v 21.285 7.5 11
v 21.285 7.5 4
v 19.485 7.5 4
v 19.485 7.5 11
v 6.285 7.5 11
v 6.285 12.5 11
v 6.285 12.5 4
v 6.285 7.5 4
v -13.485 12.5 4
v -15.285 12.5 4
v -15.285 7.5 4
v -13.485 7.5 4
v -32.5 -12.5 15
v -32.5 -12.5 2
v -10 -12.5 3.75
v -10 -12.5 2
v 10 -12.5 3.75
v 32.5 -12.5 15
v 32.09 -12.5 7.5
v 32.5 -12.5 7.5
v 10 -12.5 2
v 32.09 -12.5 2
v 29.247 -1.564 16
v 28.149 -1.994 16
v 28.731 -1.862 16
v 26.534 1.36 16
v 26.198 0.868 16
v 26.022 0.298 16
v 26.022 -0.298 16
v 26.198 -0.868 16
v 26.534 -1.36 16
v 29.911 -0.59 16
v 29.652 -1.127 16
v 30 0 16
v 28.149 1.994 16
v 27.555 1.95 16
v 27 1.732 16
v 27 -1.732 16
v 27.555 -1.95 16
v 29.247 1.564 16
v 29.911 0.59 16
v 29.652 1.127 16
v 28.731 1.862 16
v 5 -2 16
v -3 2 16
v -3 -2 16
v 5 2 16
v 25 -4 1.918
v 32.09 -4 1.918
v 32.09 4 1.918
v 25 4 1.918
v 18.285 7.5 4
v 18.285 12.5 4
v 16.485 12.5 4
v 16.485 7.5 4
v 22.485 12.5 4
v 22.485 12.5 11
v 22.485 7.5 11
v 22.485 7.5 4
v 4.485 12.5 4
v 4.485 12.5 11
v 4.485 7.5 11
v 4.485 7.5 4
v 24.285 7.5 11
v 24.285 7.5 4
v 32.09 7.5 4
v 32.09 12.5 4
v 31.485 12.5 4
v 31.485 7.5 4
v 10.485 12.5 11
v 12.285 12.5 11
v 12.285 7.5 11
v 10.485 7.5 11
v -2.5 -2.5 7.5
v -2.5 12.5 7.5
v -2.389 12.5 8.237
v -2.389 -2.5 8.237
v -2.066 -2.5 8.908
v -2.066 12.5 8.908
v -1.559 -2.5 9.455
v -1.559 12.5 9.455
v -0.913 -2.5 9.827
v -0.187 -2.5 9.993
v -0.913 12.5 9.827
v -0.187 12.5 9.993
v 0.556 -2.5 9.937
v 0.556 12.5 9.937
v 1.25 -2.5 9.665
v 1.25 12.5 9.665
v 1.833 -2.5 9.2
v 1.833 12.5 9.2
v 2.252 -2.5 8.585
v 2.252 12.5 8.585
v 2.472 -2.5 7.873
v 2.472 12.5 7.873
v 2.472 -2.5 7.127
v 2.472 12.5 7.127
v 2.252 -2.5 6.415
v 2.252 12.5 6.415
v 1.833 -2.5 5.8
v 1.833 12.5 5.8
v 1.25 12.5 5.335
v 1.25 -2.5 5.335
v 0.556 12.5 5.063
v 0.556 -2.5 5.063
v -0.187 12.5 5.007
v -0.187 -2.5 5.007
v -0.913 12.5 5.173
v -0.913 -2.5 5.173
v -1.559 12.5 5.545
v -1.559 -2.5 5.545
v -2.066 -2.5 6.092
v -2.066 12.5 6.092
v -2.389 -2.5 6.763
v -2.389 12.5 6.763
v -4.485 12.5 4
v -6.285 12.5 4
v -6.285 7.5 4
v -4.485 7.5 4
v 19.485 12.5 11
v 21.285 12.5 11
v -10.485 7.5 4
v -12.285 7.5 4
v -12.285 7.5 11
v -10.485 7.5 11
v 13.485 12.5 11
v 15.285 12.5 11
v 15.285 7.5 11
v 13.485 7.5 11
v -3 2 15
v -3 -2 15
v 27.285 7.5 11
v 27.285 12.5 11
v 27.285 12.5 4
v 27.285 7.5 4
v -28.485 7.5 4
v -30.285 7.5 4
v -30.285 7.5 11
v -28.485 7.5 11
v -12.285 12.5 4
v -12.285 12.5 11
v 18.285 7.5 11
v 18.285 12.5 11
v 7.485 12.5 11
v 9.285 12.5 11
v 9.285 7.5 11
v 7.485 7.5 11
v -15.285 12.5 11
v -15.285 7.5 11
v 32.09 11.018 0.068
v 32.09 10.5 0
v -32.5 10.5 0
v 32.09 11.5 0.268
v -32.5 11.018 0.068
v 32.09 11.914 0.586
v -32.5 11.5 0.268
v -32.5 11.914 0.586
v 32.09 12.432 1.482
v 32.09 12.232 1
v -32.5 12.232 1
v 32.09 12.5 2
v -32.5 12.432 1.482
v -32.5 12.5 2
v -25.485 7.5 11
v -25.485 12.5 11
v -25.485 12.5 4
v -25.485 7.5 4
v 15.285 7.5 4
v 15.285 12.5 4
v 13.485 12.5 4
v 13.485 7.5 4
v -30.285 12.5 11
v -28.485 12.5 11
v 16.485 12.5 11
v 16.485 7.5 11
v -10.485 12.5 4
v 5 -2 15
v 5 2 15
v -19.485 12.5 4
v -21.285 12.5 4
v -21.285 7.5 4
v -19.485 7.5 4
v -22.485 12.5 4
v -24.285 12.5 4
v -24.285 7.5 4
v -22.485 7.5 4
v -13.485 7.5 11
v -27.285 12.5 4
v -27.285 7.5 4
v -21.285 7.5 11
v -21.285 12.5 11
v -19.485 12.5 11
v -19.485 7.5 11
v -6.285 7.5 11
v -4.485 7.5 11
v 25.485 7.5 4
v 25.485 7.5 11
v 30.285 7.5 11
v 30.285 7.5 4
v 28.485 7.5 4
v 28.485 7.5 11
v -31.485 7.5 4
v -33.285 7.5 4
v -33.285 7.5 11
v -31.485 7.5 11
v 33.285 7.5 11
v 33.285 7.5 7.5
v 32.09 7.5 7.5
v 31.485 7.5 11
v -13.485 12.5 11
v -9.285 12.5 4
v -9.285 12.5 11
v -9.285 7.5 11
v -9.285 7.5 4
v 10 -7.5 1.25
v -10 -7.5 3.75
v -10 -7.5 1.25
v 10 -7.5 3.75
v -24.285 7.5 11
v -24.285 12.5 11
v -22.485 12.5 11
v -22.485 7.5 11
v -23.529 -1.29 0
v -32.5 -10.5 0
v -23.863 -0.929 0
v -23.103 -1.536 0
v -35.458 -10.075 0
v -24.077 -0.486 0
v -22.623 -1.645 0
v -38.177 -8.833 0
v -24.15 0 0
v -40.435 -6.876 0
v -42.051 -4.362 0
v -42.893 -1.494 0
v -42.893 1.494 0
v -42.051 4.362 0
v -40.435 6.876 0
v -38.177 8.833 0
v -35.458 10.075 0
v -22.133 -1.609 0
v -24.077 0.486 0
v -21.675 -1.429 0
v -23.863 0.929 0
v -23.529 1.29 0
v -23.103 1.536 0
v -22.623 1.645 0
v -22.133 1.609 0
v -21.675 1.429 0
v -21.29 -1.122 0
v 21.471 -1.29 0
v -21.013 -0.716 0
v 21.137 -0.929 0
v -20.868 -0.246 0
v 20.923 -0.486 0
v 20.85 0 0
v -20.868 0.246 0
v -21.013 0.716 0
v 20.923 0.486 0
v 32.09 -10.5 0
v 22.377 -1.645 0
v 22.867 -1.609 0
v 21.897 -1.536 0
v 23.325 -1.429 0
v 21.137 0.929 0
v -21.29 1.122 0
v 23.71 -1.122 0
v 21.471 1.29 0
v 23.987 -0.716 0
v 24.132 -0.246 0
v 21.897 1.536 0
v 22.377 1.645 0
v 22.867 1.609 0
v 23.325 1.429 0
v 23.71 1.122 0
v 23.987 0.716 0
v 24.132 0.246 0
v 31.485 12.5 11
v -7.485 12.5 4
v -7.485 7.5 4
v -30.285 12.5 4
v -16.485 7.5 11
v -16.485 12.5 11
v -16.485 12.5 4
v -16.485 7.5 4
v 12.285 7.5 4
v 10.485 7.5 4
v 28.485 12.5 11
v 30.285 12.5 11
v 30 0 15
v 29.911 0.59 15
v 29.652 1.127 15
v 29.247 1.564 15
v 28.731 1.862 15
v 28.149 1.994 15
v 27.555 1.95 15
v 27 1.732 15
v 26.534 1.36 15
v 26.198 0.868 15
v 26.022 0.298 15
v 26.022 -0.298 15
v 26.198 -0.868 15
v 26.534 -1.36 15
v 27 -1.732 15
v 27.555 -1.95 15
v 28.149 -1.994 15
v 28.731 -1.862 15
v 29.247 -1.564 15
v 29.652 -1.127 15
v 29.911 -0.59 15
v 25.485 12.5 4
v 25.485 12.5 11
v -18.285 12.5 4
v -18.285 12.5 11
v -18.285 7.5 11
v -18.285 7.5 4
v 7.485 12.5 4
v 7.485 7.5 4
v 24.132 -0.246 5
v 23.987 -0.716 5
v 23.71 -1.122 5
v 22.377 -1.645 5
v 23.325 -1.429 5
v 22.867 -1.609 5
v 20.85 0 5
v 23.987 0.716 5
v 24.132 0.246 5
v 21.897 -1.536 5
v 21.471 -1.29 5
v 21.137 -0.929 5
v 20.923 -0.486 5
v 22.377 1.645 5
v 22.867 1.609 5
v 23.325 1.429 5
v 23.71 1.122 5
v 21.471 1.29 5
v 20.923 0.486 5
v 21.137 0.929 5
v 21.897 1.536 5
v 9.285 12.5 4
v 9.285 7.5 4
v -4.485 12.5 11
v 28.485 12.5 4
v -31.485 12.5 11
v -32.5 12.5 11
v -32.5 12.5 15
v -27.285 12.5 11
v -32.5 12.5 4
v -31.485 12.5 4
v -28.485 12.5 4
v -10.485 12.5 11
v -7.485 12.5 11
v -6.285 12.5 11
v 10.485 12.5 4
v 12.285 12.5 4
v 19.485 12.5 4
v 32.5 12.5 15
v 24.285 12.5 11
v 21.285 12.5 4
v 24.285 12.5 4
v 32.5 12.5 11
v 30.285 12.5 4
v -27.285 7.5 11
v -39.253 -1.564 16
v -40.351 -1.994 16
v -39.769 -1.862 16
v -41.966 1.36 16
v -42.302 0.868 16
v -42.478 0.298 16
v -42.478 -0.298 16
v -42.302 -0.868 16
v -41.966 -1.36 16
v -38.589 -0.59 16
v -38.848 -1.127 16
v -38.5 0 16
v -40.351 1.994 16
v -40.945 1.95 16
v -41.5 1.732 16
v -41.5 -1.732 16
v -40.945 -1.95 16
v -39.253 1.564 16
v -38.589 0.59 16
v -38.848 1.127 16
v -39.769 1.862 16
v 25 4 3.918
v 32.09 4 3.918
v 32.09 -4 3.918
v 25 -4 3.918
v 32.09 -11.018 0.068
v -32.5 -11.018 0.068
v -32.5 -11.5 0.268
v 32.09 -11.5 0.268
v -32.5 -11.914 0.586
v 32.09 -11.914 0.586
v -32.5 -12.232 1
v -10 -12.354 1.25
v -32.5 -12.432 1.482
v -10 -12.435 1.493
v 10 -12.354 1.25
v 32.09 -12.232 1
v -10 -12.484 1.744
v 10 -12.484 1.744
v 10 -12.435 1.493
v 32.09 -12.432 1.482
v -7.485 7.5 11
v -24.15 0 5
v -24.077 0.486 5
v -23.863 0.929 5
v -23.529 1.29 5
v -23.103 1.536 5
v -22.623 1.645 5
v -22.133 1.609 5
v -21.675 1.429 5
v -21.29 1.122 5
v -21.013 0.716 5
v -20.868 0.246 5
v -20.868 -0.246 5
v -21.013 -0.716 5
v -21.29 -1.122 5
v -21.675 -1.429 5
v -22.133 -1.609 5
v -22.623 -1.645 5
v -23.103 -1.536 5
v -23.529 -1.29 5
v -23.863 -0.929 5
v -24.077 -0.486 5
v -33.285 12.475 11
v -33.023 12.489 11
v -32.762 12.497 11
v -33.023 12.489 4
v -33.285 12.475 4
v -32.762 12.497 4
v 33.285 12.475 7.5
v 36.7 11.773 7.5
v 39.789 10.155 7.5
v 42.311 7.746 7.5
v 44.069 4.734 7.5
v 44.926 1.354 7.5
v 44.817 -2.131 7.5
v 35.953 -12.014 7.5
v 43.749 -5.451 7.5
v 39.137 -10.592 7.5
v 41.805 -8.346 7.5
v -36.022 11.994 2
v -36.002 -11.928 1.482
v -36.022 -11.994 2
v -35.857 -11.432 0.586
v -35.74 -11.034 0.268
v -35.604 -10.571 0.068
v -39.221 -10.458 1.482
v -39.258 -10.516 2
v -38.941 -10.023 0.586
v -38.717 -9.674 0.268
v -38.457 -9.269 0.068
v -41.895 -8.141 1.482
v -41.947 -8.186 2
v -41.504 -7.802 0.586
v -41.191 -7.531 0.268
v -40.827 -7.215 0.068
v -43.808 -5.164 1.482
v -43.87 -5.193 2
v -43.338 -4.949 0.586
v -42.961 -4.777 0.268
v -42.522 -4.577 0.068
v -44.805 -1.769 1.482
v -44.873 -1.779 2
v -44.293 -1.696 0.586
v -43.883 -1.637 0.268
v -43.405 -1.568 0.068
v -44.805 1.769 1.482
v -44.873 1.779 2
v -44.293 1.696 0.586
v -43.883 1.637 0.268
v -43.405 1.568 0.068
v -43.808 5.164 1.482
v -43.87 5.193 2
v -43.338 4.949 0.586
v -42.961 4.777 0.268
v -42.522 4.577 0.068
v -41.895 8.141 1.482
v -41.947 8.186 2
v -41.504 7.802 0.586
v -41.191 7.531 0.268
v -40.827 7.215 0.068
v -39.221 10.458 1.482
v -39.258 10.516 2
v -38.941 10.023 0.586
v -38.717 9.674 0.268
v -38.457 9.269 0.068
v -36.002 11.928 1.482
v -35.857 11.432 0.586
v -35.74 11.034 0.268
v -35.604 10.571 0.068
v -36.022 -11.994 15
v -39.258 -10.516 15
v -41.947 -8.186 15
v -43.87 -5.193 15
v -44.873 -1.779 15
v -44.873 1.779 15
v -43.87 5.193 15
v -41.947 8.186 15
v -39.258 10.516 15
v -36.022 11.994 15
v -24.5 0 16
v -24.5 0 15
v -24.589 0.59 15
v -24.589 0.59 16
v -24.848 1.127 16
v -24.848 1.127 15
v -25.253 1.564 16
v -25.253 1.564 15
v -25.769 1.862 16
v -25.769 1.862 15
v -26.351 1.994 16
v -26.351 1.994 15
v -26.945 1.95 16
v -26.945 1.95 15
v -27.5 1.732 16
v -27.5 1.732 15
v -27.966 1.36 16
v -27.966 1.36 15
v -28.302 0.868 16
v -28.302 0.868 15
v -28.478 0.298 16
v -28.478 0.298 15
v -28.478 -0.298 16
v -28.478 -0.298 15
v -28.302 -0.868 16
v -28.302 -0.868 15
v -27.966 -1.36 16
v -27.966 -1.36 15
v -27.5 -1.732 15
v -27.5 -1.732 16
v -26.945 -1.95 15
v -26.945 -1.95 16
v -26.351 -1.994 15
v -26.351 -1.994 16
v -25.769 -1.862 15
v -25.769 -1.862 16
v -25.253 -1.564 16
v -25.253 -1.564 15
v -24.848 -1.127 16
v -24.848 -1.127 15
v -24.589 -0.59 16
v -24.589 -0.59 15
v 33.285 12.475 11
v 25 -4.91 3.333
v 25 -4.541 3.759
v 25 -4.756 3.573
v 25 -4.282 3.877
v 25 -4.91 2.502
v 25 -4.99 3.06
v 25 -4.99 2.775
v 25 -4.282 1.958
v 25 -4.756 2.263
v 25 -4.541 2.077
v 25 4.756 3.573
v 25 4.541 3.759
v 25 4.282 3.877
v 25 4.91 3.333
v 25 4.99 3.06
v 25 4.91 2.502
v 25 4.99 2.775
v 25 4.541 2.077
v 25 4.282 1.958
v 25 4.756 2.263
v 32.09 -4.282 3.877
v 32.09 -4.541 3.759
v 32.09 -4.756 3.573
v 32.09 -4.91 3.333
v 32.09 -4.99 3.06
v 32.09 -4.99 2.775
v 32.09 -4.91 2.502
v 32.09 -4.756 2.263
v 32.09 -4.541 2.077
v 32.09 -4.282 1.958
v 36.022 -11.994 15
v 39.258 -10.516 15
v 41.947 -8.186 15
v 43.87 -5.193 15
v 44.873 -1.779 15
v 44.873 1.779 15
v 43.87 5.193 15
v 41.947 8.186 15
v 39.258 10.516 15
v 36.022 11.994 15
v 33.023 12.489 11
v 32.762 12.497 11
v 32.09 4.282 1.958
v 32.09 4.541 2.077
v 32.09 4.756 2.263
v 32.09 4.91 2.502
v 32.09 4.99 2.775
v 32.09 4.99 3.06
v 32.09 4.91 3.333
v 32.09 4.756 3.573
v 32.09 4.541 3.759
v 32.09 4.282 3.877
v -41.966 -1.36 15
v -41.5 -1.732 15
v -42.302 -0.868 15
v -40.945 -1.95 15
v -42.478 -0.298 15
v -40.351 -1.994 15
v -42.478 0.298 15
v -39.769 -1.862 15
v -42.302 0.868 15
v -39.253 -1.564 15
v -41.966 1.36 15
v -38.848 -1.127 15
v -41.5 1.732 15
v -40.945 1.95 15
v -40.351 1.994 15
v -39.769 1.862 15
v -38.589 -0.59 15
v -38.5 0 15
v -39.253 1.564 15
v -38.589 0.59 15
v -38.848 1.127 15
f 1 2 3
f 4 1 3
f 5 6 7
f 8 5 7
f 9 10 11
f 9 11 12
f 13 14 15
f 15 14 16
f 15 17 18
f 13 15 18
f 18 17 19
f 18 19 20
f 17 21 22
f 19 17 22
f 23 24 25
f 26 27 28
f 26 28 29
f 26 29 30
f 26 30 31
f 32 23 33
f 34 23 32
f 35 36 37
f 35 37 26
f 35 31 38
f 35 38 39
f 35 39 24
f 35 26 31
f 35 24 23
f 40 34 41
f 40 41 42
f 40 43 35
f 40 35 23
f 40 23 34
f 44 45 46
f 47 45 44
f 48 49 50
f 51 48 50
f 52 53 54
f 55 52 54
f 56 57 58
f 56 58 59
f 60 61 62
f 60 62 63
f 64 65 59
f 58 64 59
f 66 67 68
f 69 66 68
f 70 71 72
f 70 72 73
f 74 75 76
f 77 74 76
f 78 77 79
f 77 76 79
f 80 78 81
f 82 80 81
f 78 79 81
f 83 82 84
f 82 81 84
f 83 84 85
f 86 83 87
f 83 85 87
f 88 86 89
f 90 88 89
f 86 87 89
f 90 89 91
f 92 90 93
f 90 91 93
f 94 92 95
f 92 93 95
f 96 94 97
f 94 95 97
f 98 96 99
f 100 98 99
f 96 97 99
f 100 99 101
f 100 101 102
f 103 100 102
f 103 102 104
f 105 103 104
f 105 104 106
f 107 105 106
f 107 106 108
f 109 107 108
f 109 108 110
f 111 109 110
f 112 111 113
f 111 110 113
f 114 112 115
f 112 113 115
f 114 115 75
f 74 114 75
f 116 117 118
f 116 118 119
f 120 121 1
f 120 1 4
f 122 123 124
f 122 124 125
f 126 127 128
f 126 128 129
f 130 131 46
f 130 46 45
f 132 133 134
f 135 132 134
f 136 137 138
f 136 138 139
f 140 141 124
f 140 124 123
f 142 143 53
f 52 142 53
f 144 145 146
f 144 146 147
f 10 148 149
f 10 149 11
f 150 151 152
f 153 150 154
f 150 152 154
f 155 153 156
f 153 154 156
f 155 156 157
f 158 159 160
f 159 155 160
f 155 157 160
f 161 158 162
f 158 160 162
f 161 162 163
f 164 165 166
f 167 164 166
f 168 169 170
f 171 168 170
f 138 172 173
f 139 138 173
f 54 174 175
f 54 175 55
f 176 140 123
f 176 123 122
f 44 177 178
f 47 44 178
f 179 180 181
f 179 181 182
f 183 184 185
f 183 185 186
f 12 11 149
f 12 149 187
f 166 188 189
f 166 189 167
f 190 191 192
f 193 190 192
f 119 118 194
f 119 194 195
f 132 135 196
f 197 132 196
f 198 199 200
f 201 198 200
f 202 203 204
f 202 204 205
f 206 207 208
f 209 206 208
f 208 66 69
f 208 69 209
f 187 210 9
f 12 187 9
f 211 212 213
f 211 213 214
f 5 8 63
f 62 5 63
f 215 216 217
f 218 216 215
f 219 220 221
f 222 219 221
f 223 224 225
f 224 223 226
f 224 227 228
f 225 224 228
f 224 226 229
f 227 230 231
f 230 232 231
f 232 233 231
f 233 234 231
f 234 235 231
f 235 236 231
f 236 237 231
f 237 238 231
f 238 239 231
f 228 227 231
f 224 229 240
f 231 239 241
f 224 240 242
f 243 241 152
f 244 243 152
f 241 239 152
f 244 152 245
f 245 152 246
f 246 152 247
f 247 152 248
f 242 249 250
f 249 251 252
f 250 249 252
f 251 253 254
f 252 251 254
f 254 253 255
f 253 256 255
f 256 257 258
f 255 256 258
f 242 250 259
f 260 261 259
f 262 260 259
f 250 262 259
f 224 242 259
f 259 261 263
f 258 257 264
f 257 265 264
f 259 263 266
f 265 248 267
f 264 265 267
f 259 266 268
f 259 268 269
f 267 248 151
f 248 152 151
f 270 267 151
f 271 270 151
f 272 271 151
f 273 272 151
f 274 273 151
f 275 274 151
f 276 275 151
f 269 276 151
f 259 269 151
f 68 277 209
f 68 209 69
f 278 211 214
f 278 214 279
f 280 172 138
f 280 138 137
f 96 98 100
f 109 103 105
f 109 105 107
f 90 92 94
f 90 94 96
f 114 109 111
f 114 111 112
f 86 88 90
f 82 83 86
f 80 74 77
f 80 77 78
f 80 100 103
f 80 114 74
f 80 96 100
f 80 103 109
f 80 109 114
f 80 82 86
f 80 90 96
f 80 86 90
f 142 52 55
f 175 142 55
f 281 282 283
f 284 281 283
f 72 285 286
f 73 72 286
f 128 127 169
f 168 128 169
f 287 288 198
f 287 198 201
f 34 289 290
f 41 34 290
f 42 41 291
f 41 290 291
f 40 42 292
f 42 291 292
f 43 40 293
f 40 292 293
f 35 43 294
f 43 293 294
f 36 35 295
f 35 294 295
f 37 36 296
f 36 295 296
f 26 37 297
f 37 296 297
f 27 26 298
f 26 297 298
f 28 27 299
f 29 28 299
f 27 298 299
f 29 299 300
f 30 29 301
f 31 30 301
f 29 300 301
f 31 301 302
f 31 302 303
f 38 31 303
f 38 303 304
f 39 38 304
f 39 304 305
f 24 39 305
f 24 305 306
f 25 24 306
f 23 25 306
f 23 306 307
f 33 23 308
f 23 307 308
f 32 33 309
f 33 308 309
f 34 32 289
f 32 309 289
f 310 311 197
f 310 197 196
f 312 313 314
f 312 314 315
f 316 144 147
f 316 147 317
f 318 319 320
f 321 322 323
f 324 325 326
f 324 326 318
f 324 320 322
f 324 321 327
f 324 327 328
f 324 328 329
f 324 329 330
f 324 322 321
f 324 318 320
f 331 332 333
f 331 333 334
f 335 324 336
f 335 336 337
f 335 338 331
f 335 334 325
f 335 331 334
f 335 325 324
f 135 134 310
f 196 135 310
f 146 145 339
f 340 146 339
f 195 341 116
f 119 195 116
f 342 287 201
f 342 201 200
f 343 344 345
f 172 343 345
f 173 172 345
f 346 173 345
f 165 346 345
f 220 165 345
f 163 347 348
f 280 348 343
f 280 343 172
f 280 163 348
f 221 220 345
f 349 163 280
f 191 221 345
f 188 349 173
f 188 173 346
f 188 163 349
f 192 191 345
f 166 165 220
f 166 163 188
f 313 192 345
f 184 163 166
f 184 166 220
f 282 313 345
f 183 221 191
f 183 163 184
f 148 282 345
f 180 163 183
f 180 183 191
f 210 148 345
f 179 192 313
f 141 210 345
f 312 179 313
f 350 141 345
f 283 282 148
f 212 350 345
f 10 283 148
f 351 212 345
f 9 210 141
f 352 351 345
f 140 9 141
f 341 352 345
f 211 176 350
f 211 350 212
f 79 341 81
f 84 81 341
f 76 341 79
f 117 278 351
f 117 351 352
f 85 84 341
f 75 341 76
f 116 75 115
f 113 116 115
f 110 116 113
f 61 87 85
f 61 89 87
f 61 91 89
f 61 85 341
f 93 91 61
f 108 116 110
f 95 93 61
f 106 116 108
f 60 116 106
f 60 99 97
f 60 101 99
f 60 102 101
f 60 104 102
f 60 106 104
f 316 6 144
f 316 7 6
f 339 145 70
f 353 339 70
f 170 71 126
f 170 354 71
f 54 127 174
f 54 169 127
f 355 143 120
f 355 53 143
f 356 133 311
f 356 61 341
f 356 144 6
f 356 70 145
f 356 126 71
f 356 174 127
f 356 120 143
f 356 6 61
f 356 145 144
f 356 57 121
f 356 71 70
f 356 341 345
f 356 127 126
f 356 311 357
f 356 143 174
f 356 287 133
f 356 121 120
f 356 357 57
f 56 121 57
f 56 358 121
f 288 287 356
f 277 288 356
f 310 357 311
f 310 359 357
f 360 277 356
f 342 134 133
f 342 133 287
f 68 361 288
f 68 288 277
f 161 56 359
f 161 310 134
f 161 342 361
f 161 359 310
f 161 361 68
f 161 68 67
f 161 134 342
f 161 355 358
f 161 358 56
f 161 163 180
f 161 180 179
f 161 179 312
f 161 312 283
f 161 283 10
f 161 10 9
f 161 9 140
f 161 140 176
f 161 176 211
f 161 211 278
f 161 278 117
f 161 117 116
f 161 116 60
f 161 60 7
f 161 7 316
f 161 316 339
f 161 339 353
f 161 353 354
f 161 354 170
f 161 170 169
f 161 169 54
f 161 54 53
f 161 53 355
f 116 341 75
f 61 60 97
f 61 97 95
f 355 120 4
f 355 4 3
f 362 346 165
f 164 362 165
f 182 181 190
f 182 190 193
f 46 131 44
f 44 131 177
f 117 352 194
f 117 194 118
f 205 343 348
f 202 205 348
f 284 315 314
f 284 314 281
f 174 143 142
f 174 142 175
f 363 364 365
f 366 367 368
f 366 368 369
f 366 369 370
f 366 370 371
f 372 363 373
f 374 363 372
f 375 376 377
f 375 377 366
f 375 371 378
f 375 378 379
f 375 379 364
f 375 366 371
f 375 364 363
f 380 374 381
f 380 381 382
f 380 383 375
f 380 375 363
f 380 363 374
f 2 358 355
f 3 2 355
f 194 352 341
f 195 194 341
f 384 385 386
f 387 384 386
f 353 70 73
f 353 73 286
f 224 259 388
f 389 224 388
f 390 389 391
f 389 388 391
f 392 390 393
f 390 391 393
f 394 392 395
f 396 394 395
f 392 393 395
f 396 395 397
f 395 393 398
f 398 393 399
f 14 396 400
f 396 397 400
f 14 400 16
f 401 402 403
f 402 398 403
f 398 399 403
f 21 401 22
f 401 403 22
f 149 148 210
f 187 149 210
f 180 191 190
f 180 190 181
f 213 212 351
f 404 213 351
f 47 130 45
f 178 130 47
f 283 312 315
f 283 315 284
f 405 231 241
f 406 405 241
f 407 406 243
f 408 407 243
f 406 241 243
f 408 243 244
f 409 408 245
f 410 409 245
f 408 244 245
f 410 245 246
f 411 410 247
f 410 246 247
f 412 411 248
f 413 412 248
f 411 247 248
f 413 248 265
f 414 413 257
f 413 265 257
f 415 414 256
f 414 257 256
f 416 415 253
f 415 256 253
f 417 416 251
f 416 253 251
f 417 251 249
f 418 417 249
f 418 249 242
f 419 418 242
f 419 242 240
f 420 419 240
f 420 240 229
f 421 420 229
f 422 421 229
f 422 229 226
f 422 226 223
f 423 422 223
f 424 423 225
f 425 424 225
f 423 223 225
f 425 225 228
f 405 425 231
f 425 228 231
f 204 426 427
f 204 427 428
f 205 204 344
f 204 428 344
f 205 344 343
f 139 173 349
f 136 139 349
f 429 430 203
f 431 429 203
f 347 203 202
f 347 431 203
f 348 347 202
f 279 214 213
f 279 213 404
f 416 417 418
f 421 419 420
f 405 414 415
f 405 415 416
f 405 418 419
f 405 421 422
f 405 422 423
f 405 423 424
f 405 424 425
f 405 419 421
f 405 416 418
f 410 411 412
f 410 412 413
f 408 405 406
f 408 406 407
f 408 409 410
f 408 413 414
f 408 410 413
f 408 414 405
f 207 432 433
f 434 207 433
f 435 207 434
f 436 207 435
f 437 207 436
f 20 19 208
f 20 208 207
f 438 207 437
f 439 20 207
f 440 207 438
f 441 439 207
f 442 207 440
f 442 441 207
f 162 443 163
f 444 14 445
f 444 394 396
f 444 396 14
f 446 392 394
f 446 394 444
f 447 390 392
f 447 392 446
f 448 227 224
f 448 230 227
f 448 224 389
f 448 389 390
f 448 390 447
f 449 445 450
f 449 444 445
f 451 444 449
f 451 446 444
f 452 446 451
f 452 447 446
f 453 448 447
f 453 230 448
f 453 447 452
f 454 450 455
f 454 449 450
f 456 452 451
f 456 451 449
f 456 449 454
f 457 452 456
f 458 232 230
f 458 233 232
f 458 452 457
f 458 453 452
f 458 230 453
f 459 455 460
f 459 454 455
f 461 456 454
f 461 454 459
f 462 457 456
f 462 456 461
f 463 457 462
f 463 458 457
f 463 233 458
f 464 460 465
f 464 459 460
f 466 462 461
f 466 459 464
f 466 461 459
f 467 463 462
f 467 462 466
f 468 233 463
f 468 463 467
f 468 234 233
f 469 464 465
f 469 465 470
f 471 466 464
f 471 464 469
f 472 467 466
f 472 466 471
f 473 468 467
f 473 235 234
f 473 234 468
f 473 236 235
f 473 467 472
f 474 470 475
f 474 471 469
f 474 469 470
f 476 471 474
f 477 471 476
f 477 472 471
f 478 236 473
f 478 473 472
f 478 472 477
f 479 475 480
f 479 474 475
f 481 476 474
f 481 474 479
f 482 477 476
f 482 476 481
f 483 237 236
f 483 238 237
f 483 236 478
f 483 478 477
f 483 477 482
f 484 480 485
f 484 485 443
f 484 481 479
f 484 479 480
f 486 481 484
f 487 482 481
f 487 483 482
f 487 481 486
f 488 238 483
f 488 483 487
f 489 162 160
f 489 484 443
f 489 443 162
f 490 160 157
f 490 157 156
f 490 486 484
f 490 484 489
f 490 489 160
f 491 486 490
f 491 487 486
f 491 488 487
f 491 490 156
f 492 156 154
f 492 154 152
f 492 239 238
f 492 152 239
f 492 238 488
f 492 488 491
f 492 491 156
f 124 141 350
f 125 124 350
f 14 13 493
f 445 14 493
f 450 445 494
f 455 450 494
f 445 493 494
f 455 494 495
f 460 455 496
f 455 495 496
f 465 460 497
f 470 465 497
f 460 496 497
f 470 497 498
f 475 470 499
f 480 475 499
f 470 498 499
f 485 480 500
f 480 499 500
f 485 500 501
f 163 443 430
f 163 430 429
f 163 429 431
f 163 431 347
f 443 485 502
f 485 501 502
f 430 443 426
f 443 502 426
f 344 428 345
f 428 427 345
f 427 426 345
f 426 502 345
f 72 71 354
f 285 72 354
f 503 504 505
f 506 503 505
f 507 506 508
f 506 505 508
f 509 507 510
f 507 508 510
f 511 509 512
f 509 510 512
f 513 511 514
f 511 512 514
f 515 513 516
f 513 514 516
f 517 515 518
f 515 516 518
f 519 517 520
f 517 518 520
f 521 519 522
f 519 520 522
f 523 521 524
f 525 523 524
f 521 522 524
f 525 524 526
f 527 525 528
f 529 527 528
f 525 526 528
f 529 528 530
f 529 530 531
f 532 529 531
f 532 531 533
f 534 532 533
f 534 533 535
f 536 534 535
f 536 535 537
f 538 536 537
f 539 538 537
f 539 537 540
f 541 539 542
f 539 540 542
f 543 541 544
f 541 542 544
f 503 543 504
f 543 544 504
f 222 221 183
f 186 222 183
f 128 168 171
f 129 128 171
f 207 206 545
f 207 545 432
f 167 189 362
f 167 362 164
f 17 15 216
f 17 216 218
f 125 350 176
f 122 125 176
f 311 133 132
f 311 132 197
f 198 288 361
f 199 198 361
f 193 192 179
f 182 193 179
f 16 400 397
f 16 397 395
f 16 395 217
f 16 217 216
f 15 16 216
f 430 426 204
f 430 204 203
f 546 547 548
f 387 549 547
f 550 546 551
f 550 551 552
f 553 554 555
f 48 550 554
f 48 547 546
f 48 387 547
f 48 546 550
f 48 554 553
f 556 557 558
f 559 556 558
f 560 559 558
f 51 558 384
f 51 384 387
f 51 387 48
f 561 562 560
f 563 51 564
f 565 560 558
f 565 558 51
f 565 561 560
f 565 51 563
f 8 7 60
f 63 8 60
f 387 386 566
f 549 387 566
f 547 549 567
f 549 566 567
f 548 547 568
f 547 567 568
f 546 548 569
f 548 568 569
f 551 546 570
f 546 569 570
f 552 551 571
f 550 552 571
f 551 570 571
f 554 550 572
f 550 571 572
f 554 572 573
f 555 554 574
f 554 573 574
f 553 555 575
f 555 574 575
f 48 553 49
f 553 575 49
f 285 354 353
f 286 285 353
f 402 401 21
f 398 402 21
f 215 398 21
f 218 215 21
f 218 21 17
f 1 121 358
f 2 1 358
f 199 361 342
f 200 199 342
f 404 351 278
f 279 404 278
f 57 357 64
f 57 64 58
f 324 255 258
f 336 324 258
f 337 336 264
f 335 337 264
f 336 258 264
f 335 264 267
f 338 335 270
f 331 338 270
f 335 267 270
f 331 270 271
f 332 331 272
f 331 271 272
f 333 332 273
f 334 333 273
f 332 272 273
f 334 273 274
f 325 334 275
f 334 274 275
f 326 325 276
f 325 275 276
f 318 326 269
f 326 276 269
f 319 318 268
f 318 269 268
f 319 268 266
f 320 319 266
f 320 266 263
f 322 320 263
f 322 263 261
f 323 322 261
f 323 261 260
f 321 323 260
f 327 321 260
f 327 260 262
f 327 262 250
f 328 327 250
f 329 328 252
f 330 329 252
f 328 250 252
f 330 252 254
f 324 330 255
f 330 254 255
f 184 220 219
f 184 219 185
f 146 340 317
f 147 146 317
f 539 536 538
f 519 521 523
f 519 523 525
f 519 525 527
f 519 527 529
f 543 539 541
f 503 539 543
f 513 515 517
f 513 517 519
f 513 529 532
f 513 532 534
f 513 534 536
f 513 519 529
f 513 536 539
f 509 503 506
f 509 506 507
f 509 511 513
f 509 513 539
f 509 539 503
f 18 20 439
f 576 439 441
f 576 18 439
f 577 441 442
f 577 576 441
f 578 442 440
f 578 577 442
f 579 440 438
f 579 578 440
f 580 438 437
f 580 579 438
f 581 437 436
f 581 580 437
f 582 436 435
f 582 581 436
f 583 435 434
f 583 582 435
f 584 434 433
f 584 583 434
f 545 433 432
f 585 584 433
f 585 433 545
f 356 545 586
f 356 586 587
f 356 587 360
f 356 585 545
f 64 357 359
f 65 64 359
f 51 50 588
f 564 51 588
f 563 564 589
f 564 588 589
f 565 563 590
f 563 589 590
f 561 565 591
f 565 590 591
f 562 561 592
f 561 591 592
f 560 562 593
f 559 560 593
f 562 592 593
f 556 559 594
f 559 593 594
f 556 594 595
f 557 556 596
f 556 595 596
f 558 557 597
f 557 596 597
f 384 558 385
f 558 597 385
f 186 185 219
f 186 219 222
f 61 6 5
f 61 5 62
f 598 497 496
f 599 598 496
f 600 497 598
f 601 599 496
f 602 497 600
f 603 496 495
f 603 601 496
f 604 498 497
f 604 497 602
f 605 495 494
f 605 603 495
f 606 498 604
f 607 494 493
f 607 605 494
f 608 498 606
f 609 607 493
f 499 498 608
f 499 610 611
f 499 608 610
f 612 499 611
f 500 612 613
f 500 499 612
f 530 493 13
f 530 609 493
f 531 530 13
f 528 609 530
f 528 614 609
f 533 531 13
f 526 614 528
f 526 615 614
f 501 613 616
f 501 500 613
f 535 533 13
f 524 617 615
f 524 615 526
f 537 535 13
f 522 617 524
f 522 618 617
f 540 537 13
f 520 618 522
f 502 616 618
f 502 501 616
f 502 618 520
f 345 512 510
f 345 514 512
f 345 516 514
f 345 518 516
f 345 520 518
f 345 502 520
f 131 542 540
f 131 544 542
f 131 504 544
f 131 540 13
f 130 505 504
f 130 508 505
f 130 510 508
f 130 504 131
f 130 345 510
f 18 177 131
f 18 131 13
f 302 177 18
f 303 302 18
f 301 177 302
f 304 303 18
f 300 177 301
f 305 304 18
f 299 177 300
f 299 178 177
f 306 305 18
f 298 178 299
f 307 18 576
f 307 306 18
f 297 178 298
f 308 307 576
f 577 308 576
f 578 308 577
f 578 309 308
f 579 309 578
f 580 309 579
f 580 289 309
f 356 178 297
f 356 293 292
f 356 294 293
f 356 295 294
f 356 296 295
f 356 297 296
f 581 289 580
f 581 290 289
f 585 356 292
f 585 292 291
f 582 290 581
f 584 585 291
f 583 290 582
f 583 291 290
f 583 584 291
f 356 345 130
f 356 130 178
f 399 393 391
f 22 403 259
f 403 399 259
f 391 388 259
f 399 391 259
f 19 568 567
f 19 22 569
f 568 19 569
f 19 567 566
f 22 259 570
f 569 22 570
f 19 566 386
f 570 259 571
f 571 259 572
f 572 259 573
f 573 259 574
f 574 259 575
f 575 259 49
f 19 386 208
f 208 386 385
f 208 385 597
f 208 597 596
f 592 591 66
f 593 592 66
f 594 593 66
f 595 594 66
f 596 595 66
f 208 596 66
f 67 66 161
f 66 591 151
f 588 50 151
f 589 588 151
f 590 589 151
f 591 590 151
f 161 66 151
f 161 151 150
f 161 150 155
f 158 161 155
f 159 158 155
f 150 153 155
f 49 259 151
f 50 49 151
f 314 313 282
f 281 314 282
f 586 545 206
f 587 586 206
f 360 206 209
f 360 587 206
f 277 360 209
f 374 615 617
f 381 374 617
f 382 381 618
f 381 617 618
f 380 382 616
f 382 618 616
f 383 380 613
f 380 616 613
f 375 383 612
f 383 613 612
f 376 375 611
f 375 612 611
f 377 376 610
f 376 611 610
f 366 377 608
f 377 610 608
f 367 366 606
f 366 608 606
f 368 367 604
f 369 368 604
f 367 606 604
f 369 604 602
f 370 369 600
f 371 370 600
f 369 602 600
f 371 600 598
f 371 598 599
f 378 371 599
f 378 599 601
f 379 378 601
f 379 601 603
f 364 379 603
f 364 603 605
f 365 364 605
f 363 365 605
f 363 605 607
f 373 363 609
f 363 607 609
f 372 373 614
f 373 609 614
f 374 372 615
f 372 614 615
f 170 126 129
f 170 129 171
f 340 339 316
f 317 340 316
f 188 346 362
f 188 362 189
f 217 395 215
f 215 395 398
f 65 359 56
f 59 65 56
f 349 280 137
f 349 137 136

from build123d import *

# Parameters (mm, degrees)
SKETCH_1_W           = 90
SKETCH_1_H           = 25
EXTRUDE_1_DEPTH      = 15
CUT_EXTRUDE_1_DEPTH  = 15
SKETCH_3_R           = 2.5
CUT_EXTRUDE_2_DEPTH  = 15
SKETCH_4_W           = 1.8
SKETCH_4_H           = 7
CUT_EXTRUDE_3_DEPTH  = 5
SKETCH_5_R           = 1.65
CUT_EXTRUDE_4_DEPTH  = 5
SKETCH_6_W           = 20
SKETCH_6_H           = 2.5
CUT_EXTRUDE_5_DEPTH  = 5
CUT_EXTRUDE_7_DEPTH  = 7.5
CUT_EXTRUDE_8_DEPTH  = 7.5
SKETCH_9_R           = 2
SKETCH_9_W           = 8
SKETCH_9_H           = 4
EXTRUDE_2_DEPTH      = 1
FILLET_1_R           = 2
CUT_EXTRUDE_10_REACH = 51.369
SKETCH_15_W          = 17.204453114
SKETCH_15_H          = 35.420932882


with BuildPart() as part:
    # 草图1 → 凸台-拉伸1 (new body)
    with BuildSketch(Plane.XY):
        Rectangle(SKETCH_1_W, SKETCH_1_H)
    extrude(amount=EXTRUDE_1_DEPTH)

    # 草图2 → 切除-拉伸1 (cut)
    with BuildSketch(Plane.XY.offset(15)):
        with BuildLine():
            Line((-32.5, 12.5), (-61.464378833, 12.5))
            Line((-61.464378833, 12.5), (-61.464378833, -12.5))
            Line((-61.464378833, -12.5), (-32.5, -12.5))
            ThreePointArc((-32.5, -12.5), (-45, 0), (-32.5, 12.5))
        make_face()
        with BuildLine():
            Line((32.5, 12.5), (60.882590951, 12.5))
            Line((60.882590951, 12.5), (60.882590951, -12.5))
            Line((60.882590951, -12.5), (32.5, -12.5))
            ThreePointArc((32.5, -12.5), (45, 0), (32.5, 12.5))
        make_face()
    extrude(amount=-CUT_EXTRUDE_1_DEPTH, mode=Mode.SUBTRACT)

    # 草图3 → 切除-拉伸2 (cut)
    with BuildSketch(Plane(origin=(0, 12.5, 0), x_dir=(1, 0, 0), z_dir=(0, 1, 0))):
        with Locations(Location((0, -7.5, 0), (0, 0, 180))):
            Circle(SKETCH_3_R)
    extrude(amount=-CUT_EXTRUDE_2_DEPTH, mode=Mode.SUBTRACT)

    # 草图4 → 切除-拉伸3 (cut)
    with BuildSketch(Plane(origin=(0, 12.5, 0), x_dir=(1, 0, 0), z_dir=(0, 1, 0))):
        with Locations((-8.384632086, -7.5)):
            Rectangle(SKETCH_4_W, SKETCH_4_H)
        with Locations((-5.384632086, -7.5)):
            Rectangle(SKETCH_4_W, SKETCH_4_H)
        with Locations((-11.384632086, -7.5)):
            Rectangle(SKETCH_4_W, SKETCH_4_H)
        with Locations((-14.384632086, -7.5)):
            Rectangle(SKETCH_4_W, SKETCH_4_H)
        with Locations((-17.384632086, -7.5)):
            Rectangle(SKETCH_4_W, SKETCH_4_H)
        with Locations((-20.384632086, -7.5)):
            Rectangle(SKETCH_4_W, SKETCH_4_H)
        with Locations((-23.384632086, -7.5)):
            Rectangle(SKETCH_4_W, SKETCH_4_H)
        with Locations((-26.384632086, -7.5)):
            Rectangle(SKETCH_4_W, SKETCH_4_H)
        with Locations((-29.384632086, -7.5)):
            Rectangle(SKETCH_4_W, SKETCH_4_H)
        with Locations((-32.384632086, -7.5)):
            Rectangle(SKETCH_4_W, SKETCH_4_H)
    cut_extrude_3 = extrude(amount=-CUT_EXTRUDE_3_DEPTH, mode=Mode.SUBTRACT)

    # 镜向1: 切除-拉伸3 across plane
    add(cut_extrude_3.mirror(Plane(origin=(0, 0, 0), x_dir=(0, 0, 1), z_dir=(1, 0, 0))), mode=Mode.SUBTRACT)

    # 草图5 → 切除-拉伸4 (cut)
    with BuildSketch(Plane(origin=(0, 0, 0), x_dir=(-1, 0, 0), z_dir=(0, 0, -1))):
        with Locations((-22.5, 0)):
            Circle(SKETCH_5_R)
        with Locations((22.5, 0)):
            Circle(SKETCH_5_R)
    extrude(amount=-CUT_EXTRUDE_4_DEPTH, mode=Mode.SUBTRACT)

    # 草图6 → 切除-拉伸5 (cut)
    with BuildSketch(Plane.XZ.offset(12.5)):
        with Locations((0, 2.5)):
            Rectangle(SKETCH_6_W, SKETCH_6_H)
    extrude(amount=-CUT_EXTRUDE_5_DEPTH, mode=Mode.SUBTRACT)

    # 草图7 → 切除-拉伸7 (cut)
    with BuildSketch(Plane(origin=(0, 0, 0), x_dir=(-1, 0, 0), z_dir=(0, 0, -1))):
        with BuildLine():
            Line((-32.5, 9), (-32.5, -9))
            ThreePointArc((-32.5, -9), (-41.5, 0), (-32.5, 9))
        make_face()
    extrude(amount=-CUT_EXTRUDE_7_DEPTH, mode=Mode.SUBTRACT)

    # 草图8 → 切除-拉伸8 (cut)
    with BuildSketch(Plane(origin=(32.5, 0, 0), x_dir=(0, 0, -1), z_dir=(1, 0, 0))):
        with BuildLine():
            Line((-1.91780044, -4), (-1.91780044, 4))
            ThreePointArc((-1.91780044, 4), (-2.91780044, 5), (-3.91780044, 4))
            Line((-3.91780044, 4), (-3.91780044, -4))
            ThreePointArc((-3.91780044, -4), (-2.91780044, -5), (-1.91780044, -4))
        make_face()
    extrude(amount=-CUT_EXTRUDE_8_DEPTH, mode=Mode.SUBTRACT)

    # 草图9 → 凸台-拉伸2 (add)
    with BuildSketch(Plane.XY.offset(15)):
        with Locations((28, 0)):
            Circle(SKETCH_9_R)
        with Locations((-26.5, 0)):
            Circle(SKETCH_9_R)
        with Locations((-40.5, 0)):
            Circle(SKETCH_9_R)
        with Locations((1, 0)):
            Rectangle(SKETCH_9_W, SKETCH_9_H)
    extrude(amount=EXTRUDE_2_DEPTH)

    # 圆角1
    # the kernel refuses this fillet: 2 mm, written as the material it takes off along each edge
    with BuildSketch(Plane(origin=(32.5, -12.5, 0), x_dir=(0, 0, 1), z_dir=(-1, 0, 0))) as fillet_1_piece_1:
        with BuildLine():
            CenterArc((FILLET_1_R, FILLET_1_R), FILLET_1_R, 180, 90)
            Line((0, FILLET_1_R), (0, 0))
            Line((0, 0), (FILLET_1_R, 0))
        make_face()
    extrude(amount=65, mode=Mode.SUBTRACT)
    with BuildSketch(Plane(origin=(-32.5, 0, 0), x_dir=(0, -1, 0), z_dir=(1, 0, 0))) as fillet_1_piece_2:
        with BuildLine():
            CenterArc((12.5 - FILLET_1_R, -FILLET_1_R), FILLET_1_R, 0, 90)
            Line((12.5, -FILLET_1_R), (12.5, 0))
            Line((12.5, 0), (12.5 - FILLET_1_R, 0))
        make_face()
    revolve(axis=Axis((-32.5, 0, 0), (0, 0, -1)), revolution_arc=180, mode=Mode.SUBTRACT)
    with BuildSketch(Plane(origin=(-32.5, 12.5, 0), x_dir=(0, -1, 0), z_dir=(1, 0, 0))) as fillet_1_piece_3:
        with BuildLine():
            CenterArc((FILLET_1_R, -FILLET_1_R), FILLET_1_R, 90, 90)
            Line((0, -FILLET_1_R), (0, 0))
            Line((0, 0), (FILLET_1_R, 0))
        make_face()
    extrude(amount=65, mode=Mode.SUBTRACT)
    with BuildSketch(Plane(origin=(32.5, 0, 0), x_dir=(0, 1, 0), z_dir=(-1, 0, 0))) as fillet_1_piece_4:
        with BuildLine():
            CenterArc((12.5 - FILLET_1_R, -FILLET_1_R), FILLET_1_R, 0, 90)
            Line((12.5, -FILLET_1_R), (12.5, 0))
            Line((12.5, 0), (12.5 - FILLET_1_R, 0))
        make_face()
    revolve(axis=Axis((32.5, 0, 0), (0, 0, -1)), revolution_arc=180, mode=Mode.SUBTRACT)

    # 切除-拉伸10: up to this face of the body (flat: up to its plane)
    cut_extrude_10_end = Plane(part.part.faces().sort_by_distance((36.351487084, -0.076382797, 7.5))[0])
    # 草图15 → 切除-拉伸10 (cut, up to the picked face)
    with BuildSketch(Plane(origin=(0, 0, 0), x_dir=(-1, 0, 0), z_dir=(0, 0, -1)), mode=Mode.PRIVATE) as cut_extrude_10_sk1:
        with Locations((-40.69229177, 2.139850544)):
            Rectangle(SKETCH_15_W, SKETCH_15_H)
    cut_extrude_10_tool1 = split(extrude(cut_extrude_10_sk1.sketch, amount=-CUT_EXTRUDE_10_REACH, mode=Mode.PRIVATE), bisect_by=cut_extrude_10_end, keep=Keep.BOTH, mode=Mode.PRIVATE)
    add(cut_extrude_10_tool1.solids().sort_by(Axis((40.692292, 2.139851, 0), (0, 0, 1)))[0], mode=Mode.SUBTRACT)


solid = part.part
